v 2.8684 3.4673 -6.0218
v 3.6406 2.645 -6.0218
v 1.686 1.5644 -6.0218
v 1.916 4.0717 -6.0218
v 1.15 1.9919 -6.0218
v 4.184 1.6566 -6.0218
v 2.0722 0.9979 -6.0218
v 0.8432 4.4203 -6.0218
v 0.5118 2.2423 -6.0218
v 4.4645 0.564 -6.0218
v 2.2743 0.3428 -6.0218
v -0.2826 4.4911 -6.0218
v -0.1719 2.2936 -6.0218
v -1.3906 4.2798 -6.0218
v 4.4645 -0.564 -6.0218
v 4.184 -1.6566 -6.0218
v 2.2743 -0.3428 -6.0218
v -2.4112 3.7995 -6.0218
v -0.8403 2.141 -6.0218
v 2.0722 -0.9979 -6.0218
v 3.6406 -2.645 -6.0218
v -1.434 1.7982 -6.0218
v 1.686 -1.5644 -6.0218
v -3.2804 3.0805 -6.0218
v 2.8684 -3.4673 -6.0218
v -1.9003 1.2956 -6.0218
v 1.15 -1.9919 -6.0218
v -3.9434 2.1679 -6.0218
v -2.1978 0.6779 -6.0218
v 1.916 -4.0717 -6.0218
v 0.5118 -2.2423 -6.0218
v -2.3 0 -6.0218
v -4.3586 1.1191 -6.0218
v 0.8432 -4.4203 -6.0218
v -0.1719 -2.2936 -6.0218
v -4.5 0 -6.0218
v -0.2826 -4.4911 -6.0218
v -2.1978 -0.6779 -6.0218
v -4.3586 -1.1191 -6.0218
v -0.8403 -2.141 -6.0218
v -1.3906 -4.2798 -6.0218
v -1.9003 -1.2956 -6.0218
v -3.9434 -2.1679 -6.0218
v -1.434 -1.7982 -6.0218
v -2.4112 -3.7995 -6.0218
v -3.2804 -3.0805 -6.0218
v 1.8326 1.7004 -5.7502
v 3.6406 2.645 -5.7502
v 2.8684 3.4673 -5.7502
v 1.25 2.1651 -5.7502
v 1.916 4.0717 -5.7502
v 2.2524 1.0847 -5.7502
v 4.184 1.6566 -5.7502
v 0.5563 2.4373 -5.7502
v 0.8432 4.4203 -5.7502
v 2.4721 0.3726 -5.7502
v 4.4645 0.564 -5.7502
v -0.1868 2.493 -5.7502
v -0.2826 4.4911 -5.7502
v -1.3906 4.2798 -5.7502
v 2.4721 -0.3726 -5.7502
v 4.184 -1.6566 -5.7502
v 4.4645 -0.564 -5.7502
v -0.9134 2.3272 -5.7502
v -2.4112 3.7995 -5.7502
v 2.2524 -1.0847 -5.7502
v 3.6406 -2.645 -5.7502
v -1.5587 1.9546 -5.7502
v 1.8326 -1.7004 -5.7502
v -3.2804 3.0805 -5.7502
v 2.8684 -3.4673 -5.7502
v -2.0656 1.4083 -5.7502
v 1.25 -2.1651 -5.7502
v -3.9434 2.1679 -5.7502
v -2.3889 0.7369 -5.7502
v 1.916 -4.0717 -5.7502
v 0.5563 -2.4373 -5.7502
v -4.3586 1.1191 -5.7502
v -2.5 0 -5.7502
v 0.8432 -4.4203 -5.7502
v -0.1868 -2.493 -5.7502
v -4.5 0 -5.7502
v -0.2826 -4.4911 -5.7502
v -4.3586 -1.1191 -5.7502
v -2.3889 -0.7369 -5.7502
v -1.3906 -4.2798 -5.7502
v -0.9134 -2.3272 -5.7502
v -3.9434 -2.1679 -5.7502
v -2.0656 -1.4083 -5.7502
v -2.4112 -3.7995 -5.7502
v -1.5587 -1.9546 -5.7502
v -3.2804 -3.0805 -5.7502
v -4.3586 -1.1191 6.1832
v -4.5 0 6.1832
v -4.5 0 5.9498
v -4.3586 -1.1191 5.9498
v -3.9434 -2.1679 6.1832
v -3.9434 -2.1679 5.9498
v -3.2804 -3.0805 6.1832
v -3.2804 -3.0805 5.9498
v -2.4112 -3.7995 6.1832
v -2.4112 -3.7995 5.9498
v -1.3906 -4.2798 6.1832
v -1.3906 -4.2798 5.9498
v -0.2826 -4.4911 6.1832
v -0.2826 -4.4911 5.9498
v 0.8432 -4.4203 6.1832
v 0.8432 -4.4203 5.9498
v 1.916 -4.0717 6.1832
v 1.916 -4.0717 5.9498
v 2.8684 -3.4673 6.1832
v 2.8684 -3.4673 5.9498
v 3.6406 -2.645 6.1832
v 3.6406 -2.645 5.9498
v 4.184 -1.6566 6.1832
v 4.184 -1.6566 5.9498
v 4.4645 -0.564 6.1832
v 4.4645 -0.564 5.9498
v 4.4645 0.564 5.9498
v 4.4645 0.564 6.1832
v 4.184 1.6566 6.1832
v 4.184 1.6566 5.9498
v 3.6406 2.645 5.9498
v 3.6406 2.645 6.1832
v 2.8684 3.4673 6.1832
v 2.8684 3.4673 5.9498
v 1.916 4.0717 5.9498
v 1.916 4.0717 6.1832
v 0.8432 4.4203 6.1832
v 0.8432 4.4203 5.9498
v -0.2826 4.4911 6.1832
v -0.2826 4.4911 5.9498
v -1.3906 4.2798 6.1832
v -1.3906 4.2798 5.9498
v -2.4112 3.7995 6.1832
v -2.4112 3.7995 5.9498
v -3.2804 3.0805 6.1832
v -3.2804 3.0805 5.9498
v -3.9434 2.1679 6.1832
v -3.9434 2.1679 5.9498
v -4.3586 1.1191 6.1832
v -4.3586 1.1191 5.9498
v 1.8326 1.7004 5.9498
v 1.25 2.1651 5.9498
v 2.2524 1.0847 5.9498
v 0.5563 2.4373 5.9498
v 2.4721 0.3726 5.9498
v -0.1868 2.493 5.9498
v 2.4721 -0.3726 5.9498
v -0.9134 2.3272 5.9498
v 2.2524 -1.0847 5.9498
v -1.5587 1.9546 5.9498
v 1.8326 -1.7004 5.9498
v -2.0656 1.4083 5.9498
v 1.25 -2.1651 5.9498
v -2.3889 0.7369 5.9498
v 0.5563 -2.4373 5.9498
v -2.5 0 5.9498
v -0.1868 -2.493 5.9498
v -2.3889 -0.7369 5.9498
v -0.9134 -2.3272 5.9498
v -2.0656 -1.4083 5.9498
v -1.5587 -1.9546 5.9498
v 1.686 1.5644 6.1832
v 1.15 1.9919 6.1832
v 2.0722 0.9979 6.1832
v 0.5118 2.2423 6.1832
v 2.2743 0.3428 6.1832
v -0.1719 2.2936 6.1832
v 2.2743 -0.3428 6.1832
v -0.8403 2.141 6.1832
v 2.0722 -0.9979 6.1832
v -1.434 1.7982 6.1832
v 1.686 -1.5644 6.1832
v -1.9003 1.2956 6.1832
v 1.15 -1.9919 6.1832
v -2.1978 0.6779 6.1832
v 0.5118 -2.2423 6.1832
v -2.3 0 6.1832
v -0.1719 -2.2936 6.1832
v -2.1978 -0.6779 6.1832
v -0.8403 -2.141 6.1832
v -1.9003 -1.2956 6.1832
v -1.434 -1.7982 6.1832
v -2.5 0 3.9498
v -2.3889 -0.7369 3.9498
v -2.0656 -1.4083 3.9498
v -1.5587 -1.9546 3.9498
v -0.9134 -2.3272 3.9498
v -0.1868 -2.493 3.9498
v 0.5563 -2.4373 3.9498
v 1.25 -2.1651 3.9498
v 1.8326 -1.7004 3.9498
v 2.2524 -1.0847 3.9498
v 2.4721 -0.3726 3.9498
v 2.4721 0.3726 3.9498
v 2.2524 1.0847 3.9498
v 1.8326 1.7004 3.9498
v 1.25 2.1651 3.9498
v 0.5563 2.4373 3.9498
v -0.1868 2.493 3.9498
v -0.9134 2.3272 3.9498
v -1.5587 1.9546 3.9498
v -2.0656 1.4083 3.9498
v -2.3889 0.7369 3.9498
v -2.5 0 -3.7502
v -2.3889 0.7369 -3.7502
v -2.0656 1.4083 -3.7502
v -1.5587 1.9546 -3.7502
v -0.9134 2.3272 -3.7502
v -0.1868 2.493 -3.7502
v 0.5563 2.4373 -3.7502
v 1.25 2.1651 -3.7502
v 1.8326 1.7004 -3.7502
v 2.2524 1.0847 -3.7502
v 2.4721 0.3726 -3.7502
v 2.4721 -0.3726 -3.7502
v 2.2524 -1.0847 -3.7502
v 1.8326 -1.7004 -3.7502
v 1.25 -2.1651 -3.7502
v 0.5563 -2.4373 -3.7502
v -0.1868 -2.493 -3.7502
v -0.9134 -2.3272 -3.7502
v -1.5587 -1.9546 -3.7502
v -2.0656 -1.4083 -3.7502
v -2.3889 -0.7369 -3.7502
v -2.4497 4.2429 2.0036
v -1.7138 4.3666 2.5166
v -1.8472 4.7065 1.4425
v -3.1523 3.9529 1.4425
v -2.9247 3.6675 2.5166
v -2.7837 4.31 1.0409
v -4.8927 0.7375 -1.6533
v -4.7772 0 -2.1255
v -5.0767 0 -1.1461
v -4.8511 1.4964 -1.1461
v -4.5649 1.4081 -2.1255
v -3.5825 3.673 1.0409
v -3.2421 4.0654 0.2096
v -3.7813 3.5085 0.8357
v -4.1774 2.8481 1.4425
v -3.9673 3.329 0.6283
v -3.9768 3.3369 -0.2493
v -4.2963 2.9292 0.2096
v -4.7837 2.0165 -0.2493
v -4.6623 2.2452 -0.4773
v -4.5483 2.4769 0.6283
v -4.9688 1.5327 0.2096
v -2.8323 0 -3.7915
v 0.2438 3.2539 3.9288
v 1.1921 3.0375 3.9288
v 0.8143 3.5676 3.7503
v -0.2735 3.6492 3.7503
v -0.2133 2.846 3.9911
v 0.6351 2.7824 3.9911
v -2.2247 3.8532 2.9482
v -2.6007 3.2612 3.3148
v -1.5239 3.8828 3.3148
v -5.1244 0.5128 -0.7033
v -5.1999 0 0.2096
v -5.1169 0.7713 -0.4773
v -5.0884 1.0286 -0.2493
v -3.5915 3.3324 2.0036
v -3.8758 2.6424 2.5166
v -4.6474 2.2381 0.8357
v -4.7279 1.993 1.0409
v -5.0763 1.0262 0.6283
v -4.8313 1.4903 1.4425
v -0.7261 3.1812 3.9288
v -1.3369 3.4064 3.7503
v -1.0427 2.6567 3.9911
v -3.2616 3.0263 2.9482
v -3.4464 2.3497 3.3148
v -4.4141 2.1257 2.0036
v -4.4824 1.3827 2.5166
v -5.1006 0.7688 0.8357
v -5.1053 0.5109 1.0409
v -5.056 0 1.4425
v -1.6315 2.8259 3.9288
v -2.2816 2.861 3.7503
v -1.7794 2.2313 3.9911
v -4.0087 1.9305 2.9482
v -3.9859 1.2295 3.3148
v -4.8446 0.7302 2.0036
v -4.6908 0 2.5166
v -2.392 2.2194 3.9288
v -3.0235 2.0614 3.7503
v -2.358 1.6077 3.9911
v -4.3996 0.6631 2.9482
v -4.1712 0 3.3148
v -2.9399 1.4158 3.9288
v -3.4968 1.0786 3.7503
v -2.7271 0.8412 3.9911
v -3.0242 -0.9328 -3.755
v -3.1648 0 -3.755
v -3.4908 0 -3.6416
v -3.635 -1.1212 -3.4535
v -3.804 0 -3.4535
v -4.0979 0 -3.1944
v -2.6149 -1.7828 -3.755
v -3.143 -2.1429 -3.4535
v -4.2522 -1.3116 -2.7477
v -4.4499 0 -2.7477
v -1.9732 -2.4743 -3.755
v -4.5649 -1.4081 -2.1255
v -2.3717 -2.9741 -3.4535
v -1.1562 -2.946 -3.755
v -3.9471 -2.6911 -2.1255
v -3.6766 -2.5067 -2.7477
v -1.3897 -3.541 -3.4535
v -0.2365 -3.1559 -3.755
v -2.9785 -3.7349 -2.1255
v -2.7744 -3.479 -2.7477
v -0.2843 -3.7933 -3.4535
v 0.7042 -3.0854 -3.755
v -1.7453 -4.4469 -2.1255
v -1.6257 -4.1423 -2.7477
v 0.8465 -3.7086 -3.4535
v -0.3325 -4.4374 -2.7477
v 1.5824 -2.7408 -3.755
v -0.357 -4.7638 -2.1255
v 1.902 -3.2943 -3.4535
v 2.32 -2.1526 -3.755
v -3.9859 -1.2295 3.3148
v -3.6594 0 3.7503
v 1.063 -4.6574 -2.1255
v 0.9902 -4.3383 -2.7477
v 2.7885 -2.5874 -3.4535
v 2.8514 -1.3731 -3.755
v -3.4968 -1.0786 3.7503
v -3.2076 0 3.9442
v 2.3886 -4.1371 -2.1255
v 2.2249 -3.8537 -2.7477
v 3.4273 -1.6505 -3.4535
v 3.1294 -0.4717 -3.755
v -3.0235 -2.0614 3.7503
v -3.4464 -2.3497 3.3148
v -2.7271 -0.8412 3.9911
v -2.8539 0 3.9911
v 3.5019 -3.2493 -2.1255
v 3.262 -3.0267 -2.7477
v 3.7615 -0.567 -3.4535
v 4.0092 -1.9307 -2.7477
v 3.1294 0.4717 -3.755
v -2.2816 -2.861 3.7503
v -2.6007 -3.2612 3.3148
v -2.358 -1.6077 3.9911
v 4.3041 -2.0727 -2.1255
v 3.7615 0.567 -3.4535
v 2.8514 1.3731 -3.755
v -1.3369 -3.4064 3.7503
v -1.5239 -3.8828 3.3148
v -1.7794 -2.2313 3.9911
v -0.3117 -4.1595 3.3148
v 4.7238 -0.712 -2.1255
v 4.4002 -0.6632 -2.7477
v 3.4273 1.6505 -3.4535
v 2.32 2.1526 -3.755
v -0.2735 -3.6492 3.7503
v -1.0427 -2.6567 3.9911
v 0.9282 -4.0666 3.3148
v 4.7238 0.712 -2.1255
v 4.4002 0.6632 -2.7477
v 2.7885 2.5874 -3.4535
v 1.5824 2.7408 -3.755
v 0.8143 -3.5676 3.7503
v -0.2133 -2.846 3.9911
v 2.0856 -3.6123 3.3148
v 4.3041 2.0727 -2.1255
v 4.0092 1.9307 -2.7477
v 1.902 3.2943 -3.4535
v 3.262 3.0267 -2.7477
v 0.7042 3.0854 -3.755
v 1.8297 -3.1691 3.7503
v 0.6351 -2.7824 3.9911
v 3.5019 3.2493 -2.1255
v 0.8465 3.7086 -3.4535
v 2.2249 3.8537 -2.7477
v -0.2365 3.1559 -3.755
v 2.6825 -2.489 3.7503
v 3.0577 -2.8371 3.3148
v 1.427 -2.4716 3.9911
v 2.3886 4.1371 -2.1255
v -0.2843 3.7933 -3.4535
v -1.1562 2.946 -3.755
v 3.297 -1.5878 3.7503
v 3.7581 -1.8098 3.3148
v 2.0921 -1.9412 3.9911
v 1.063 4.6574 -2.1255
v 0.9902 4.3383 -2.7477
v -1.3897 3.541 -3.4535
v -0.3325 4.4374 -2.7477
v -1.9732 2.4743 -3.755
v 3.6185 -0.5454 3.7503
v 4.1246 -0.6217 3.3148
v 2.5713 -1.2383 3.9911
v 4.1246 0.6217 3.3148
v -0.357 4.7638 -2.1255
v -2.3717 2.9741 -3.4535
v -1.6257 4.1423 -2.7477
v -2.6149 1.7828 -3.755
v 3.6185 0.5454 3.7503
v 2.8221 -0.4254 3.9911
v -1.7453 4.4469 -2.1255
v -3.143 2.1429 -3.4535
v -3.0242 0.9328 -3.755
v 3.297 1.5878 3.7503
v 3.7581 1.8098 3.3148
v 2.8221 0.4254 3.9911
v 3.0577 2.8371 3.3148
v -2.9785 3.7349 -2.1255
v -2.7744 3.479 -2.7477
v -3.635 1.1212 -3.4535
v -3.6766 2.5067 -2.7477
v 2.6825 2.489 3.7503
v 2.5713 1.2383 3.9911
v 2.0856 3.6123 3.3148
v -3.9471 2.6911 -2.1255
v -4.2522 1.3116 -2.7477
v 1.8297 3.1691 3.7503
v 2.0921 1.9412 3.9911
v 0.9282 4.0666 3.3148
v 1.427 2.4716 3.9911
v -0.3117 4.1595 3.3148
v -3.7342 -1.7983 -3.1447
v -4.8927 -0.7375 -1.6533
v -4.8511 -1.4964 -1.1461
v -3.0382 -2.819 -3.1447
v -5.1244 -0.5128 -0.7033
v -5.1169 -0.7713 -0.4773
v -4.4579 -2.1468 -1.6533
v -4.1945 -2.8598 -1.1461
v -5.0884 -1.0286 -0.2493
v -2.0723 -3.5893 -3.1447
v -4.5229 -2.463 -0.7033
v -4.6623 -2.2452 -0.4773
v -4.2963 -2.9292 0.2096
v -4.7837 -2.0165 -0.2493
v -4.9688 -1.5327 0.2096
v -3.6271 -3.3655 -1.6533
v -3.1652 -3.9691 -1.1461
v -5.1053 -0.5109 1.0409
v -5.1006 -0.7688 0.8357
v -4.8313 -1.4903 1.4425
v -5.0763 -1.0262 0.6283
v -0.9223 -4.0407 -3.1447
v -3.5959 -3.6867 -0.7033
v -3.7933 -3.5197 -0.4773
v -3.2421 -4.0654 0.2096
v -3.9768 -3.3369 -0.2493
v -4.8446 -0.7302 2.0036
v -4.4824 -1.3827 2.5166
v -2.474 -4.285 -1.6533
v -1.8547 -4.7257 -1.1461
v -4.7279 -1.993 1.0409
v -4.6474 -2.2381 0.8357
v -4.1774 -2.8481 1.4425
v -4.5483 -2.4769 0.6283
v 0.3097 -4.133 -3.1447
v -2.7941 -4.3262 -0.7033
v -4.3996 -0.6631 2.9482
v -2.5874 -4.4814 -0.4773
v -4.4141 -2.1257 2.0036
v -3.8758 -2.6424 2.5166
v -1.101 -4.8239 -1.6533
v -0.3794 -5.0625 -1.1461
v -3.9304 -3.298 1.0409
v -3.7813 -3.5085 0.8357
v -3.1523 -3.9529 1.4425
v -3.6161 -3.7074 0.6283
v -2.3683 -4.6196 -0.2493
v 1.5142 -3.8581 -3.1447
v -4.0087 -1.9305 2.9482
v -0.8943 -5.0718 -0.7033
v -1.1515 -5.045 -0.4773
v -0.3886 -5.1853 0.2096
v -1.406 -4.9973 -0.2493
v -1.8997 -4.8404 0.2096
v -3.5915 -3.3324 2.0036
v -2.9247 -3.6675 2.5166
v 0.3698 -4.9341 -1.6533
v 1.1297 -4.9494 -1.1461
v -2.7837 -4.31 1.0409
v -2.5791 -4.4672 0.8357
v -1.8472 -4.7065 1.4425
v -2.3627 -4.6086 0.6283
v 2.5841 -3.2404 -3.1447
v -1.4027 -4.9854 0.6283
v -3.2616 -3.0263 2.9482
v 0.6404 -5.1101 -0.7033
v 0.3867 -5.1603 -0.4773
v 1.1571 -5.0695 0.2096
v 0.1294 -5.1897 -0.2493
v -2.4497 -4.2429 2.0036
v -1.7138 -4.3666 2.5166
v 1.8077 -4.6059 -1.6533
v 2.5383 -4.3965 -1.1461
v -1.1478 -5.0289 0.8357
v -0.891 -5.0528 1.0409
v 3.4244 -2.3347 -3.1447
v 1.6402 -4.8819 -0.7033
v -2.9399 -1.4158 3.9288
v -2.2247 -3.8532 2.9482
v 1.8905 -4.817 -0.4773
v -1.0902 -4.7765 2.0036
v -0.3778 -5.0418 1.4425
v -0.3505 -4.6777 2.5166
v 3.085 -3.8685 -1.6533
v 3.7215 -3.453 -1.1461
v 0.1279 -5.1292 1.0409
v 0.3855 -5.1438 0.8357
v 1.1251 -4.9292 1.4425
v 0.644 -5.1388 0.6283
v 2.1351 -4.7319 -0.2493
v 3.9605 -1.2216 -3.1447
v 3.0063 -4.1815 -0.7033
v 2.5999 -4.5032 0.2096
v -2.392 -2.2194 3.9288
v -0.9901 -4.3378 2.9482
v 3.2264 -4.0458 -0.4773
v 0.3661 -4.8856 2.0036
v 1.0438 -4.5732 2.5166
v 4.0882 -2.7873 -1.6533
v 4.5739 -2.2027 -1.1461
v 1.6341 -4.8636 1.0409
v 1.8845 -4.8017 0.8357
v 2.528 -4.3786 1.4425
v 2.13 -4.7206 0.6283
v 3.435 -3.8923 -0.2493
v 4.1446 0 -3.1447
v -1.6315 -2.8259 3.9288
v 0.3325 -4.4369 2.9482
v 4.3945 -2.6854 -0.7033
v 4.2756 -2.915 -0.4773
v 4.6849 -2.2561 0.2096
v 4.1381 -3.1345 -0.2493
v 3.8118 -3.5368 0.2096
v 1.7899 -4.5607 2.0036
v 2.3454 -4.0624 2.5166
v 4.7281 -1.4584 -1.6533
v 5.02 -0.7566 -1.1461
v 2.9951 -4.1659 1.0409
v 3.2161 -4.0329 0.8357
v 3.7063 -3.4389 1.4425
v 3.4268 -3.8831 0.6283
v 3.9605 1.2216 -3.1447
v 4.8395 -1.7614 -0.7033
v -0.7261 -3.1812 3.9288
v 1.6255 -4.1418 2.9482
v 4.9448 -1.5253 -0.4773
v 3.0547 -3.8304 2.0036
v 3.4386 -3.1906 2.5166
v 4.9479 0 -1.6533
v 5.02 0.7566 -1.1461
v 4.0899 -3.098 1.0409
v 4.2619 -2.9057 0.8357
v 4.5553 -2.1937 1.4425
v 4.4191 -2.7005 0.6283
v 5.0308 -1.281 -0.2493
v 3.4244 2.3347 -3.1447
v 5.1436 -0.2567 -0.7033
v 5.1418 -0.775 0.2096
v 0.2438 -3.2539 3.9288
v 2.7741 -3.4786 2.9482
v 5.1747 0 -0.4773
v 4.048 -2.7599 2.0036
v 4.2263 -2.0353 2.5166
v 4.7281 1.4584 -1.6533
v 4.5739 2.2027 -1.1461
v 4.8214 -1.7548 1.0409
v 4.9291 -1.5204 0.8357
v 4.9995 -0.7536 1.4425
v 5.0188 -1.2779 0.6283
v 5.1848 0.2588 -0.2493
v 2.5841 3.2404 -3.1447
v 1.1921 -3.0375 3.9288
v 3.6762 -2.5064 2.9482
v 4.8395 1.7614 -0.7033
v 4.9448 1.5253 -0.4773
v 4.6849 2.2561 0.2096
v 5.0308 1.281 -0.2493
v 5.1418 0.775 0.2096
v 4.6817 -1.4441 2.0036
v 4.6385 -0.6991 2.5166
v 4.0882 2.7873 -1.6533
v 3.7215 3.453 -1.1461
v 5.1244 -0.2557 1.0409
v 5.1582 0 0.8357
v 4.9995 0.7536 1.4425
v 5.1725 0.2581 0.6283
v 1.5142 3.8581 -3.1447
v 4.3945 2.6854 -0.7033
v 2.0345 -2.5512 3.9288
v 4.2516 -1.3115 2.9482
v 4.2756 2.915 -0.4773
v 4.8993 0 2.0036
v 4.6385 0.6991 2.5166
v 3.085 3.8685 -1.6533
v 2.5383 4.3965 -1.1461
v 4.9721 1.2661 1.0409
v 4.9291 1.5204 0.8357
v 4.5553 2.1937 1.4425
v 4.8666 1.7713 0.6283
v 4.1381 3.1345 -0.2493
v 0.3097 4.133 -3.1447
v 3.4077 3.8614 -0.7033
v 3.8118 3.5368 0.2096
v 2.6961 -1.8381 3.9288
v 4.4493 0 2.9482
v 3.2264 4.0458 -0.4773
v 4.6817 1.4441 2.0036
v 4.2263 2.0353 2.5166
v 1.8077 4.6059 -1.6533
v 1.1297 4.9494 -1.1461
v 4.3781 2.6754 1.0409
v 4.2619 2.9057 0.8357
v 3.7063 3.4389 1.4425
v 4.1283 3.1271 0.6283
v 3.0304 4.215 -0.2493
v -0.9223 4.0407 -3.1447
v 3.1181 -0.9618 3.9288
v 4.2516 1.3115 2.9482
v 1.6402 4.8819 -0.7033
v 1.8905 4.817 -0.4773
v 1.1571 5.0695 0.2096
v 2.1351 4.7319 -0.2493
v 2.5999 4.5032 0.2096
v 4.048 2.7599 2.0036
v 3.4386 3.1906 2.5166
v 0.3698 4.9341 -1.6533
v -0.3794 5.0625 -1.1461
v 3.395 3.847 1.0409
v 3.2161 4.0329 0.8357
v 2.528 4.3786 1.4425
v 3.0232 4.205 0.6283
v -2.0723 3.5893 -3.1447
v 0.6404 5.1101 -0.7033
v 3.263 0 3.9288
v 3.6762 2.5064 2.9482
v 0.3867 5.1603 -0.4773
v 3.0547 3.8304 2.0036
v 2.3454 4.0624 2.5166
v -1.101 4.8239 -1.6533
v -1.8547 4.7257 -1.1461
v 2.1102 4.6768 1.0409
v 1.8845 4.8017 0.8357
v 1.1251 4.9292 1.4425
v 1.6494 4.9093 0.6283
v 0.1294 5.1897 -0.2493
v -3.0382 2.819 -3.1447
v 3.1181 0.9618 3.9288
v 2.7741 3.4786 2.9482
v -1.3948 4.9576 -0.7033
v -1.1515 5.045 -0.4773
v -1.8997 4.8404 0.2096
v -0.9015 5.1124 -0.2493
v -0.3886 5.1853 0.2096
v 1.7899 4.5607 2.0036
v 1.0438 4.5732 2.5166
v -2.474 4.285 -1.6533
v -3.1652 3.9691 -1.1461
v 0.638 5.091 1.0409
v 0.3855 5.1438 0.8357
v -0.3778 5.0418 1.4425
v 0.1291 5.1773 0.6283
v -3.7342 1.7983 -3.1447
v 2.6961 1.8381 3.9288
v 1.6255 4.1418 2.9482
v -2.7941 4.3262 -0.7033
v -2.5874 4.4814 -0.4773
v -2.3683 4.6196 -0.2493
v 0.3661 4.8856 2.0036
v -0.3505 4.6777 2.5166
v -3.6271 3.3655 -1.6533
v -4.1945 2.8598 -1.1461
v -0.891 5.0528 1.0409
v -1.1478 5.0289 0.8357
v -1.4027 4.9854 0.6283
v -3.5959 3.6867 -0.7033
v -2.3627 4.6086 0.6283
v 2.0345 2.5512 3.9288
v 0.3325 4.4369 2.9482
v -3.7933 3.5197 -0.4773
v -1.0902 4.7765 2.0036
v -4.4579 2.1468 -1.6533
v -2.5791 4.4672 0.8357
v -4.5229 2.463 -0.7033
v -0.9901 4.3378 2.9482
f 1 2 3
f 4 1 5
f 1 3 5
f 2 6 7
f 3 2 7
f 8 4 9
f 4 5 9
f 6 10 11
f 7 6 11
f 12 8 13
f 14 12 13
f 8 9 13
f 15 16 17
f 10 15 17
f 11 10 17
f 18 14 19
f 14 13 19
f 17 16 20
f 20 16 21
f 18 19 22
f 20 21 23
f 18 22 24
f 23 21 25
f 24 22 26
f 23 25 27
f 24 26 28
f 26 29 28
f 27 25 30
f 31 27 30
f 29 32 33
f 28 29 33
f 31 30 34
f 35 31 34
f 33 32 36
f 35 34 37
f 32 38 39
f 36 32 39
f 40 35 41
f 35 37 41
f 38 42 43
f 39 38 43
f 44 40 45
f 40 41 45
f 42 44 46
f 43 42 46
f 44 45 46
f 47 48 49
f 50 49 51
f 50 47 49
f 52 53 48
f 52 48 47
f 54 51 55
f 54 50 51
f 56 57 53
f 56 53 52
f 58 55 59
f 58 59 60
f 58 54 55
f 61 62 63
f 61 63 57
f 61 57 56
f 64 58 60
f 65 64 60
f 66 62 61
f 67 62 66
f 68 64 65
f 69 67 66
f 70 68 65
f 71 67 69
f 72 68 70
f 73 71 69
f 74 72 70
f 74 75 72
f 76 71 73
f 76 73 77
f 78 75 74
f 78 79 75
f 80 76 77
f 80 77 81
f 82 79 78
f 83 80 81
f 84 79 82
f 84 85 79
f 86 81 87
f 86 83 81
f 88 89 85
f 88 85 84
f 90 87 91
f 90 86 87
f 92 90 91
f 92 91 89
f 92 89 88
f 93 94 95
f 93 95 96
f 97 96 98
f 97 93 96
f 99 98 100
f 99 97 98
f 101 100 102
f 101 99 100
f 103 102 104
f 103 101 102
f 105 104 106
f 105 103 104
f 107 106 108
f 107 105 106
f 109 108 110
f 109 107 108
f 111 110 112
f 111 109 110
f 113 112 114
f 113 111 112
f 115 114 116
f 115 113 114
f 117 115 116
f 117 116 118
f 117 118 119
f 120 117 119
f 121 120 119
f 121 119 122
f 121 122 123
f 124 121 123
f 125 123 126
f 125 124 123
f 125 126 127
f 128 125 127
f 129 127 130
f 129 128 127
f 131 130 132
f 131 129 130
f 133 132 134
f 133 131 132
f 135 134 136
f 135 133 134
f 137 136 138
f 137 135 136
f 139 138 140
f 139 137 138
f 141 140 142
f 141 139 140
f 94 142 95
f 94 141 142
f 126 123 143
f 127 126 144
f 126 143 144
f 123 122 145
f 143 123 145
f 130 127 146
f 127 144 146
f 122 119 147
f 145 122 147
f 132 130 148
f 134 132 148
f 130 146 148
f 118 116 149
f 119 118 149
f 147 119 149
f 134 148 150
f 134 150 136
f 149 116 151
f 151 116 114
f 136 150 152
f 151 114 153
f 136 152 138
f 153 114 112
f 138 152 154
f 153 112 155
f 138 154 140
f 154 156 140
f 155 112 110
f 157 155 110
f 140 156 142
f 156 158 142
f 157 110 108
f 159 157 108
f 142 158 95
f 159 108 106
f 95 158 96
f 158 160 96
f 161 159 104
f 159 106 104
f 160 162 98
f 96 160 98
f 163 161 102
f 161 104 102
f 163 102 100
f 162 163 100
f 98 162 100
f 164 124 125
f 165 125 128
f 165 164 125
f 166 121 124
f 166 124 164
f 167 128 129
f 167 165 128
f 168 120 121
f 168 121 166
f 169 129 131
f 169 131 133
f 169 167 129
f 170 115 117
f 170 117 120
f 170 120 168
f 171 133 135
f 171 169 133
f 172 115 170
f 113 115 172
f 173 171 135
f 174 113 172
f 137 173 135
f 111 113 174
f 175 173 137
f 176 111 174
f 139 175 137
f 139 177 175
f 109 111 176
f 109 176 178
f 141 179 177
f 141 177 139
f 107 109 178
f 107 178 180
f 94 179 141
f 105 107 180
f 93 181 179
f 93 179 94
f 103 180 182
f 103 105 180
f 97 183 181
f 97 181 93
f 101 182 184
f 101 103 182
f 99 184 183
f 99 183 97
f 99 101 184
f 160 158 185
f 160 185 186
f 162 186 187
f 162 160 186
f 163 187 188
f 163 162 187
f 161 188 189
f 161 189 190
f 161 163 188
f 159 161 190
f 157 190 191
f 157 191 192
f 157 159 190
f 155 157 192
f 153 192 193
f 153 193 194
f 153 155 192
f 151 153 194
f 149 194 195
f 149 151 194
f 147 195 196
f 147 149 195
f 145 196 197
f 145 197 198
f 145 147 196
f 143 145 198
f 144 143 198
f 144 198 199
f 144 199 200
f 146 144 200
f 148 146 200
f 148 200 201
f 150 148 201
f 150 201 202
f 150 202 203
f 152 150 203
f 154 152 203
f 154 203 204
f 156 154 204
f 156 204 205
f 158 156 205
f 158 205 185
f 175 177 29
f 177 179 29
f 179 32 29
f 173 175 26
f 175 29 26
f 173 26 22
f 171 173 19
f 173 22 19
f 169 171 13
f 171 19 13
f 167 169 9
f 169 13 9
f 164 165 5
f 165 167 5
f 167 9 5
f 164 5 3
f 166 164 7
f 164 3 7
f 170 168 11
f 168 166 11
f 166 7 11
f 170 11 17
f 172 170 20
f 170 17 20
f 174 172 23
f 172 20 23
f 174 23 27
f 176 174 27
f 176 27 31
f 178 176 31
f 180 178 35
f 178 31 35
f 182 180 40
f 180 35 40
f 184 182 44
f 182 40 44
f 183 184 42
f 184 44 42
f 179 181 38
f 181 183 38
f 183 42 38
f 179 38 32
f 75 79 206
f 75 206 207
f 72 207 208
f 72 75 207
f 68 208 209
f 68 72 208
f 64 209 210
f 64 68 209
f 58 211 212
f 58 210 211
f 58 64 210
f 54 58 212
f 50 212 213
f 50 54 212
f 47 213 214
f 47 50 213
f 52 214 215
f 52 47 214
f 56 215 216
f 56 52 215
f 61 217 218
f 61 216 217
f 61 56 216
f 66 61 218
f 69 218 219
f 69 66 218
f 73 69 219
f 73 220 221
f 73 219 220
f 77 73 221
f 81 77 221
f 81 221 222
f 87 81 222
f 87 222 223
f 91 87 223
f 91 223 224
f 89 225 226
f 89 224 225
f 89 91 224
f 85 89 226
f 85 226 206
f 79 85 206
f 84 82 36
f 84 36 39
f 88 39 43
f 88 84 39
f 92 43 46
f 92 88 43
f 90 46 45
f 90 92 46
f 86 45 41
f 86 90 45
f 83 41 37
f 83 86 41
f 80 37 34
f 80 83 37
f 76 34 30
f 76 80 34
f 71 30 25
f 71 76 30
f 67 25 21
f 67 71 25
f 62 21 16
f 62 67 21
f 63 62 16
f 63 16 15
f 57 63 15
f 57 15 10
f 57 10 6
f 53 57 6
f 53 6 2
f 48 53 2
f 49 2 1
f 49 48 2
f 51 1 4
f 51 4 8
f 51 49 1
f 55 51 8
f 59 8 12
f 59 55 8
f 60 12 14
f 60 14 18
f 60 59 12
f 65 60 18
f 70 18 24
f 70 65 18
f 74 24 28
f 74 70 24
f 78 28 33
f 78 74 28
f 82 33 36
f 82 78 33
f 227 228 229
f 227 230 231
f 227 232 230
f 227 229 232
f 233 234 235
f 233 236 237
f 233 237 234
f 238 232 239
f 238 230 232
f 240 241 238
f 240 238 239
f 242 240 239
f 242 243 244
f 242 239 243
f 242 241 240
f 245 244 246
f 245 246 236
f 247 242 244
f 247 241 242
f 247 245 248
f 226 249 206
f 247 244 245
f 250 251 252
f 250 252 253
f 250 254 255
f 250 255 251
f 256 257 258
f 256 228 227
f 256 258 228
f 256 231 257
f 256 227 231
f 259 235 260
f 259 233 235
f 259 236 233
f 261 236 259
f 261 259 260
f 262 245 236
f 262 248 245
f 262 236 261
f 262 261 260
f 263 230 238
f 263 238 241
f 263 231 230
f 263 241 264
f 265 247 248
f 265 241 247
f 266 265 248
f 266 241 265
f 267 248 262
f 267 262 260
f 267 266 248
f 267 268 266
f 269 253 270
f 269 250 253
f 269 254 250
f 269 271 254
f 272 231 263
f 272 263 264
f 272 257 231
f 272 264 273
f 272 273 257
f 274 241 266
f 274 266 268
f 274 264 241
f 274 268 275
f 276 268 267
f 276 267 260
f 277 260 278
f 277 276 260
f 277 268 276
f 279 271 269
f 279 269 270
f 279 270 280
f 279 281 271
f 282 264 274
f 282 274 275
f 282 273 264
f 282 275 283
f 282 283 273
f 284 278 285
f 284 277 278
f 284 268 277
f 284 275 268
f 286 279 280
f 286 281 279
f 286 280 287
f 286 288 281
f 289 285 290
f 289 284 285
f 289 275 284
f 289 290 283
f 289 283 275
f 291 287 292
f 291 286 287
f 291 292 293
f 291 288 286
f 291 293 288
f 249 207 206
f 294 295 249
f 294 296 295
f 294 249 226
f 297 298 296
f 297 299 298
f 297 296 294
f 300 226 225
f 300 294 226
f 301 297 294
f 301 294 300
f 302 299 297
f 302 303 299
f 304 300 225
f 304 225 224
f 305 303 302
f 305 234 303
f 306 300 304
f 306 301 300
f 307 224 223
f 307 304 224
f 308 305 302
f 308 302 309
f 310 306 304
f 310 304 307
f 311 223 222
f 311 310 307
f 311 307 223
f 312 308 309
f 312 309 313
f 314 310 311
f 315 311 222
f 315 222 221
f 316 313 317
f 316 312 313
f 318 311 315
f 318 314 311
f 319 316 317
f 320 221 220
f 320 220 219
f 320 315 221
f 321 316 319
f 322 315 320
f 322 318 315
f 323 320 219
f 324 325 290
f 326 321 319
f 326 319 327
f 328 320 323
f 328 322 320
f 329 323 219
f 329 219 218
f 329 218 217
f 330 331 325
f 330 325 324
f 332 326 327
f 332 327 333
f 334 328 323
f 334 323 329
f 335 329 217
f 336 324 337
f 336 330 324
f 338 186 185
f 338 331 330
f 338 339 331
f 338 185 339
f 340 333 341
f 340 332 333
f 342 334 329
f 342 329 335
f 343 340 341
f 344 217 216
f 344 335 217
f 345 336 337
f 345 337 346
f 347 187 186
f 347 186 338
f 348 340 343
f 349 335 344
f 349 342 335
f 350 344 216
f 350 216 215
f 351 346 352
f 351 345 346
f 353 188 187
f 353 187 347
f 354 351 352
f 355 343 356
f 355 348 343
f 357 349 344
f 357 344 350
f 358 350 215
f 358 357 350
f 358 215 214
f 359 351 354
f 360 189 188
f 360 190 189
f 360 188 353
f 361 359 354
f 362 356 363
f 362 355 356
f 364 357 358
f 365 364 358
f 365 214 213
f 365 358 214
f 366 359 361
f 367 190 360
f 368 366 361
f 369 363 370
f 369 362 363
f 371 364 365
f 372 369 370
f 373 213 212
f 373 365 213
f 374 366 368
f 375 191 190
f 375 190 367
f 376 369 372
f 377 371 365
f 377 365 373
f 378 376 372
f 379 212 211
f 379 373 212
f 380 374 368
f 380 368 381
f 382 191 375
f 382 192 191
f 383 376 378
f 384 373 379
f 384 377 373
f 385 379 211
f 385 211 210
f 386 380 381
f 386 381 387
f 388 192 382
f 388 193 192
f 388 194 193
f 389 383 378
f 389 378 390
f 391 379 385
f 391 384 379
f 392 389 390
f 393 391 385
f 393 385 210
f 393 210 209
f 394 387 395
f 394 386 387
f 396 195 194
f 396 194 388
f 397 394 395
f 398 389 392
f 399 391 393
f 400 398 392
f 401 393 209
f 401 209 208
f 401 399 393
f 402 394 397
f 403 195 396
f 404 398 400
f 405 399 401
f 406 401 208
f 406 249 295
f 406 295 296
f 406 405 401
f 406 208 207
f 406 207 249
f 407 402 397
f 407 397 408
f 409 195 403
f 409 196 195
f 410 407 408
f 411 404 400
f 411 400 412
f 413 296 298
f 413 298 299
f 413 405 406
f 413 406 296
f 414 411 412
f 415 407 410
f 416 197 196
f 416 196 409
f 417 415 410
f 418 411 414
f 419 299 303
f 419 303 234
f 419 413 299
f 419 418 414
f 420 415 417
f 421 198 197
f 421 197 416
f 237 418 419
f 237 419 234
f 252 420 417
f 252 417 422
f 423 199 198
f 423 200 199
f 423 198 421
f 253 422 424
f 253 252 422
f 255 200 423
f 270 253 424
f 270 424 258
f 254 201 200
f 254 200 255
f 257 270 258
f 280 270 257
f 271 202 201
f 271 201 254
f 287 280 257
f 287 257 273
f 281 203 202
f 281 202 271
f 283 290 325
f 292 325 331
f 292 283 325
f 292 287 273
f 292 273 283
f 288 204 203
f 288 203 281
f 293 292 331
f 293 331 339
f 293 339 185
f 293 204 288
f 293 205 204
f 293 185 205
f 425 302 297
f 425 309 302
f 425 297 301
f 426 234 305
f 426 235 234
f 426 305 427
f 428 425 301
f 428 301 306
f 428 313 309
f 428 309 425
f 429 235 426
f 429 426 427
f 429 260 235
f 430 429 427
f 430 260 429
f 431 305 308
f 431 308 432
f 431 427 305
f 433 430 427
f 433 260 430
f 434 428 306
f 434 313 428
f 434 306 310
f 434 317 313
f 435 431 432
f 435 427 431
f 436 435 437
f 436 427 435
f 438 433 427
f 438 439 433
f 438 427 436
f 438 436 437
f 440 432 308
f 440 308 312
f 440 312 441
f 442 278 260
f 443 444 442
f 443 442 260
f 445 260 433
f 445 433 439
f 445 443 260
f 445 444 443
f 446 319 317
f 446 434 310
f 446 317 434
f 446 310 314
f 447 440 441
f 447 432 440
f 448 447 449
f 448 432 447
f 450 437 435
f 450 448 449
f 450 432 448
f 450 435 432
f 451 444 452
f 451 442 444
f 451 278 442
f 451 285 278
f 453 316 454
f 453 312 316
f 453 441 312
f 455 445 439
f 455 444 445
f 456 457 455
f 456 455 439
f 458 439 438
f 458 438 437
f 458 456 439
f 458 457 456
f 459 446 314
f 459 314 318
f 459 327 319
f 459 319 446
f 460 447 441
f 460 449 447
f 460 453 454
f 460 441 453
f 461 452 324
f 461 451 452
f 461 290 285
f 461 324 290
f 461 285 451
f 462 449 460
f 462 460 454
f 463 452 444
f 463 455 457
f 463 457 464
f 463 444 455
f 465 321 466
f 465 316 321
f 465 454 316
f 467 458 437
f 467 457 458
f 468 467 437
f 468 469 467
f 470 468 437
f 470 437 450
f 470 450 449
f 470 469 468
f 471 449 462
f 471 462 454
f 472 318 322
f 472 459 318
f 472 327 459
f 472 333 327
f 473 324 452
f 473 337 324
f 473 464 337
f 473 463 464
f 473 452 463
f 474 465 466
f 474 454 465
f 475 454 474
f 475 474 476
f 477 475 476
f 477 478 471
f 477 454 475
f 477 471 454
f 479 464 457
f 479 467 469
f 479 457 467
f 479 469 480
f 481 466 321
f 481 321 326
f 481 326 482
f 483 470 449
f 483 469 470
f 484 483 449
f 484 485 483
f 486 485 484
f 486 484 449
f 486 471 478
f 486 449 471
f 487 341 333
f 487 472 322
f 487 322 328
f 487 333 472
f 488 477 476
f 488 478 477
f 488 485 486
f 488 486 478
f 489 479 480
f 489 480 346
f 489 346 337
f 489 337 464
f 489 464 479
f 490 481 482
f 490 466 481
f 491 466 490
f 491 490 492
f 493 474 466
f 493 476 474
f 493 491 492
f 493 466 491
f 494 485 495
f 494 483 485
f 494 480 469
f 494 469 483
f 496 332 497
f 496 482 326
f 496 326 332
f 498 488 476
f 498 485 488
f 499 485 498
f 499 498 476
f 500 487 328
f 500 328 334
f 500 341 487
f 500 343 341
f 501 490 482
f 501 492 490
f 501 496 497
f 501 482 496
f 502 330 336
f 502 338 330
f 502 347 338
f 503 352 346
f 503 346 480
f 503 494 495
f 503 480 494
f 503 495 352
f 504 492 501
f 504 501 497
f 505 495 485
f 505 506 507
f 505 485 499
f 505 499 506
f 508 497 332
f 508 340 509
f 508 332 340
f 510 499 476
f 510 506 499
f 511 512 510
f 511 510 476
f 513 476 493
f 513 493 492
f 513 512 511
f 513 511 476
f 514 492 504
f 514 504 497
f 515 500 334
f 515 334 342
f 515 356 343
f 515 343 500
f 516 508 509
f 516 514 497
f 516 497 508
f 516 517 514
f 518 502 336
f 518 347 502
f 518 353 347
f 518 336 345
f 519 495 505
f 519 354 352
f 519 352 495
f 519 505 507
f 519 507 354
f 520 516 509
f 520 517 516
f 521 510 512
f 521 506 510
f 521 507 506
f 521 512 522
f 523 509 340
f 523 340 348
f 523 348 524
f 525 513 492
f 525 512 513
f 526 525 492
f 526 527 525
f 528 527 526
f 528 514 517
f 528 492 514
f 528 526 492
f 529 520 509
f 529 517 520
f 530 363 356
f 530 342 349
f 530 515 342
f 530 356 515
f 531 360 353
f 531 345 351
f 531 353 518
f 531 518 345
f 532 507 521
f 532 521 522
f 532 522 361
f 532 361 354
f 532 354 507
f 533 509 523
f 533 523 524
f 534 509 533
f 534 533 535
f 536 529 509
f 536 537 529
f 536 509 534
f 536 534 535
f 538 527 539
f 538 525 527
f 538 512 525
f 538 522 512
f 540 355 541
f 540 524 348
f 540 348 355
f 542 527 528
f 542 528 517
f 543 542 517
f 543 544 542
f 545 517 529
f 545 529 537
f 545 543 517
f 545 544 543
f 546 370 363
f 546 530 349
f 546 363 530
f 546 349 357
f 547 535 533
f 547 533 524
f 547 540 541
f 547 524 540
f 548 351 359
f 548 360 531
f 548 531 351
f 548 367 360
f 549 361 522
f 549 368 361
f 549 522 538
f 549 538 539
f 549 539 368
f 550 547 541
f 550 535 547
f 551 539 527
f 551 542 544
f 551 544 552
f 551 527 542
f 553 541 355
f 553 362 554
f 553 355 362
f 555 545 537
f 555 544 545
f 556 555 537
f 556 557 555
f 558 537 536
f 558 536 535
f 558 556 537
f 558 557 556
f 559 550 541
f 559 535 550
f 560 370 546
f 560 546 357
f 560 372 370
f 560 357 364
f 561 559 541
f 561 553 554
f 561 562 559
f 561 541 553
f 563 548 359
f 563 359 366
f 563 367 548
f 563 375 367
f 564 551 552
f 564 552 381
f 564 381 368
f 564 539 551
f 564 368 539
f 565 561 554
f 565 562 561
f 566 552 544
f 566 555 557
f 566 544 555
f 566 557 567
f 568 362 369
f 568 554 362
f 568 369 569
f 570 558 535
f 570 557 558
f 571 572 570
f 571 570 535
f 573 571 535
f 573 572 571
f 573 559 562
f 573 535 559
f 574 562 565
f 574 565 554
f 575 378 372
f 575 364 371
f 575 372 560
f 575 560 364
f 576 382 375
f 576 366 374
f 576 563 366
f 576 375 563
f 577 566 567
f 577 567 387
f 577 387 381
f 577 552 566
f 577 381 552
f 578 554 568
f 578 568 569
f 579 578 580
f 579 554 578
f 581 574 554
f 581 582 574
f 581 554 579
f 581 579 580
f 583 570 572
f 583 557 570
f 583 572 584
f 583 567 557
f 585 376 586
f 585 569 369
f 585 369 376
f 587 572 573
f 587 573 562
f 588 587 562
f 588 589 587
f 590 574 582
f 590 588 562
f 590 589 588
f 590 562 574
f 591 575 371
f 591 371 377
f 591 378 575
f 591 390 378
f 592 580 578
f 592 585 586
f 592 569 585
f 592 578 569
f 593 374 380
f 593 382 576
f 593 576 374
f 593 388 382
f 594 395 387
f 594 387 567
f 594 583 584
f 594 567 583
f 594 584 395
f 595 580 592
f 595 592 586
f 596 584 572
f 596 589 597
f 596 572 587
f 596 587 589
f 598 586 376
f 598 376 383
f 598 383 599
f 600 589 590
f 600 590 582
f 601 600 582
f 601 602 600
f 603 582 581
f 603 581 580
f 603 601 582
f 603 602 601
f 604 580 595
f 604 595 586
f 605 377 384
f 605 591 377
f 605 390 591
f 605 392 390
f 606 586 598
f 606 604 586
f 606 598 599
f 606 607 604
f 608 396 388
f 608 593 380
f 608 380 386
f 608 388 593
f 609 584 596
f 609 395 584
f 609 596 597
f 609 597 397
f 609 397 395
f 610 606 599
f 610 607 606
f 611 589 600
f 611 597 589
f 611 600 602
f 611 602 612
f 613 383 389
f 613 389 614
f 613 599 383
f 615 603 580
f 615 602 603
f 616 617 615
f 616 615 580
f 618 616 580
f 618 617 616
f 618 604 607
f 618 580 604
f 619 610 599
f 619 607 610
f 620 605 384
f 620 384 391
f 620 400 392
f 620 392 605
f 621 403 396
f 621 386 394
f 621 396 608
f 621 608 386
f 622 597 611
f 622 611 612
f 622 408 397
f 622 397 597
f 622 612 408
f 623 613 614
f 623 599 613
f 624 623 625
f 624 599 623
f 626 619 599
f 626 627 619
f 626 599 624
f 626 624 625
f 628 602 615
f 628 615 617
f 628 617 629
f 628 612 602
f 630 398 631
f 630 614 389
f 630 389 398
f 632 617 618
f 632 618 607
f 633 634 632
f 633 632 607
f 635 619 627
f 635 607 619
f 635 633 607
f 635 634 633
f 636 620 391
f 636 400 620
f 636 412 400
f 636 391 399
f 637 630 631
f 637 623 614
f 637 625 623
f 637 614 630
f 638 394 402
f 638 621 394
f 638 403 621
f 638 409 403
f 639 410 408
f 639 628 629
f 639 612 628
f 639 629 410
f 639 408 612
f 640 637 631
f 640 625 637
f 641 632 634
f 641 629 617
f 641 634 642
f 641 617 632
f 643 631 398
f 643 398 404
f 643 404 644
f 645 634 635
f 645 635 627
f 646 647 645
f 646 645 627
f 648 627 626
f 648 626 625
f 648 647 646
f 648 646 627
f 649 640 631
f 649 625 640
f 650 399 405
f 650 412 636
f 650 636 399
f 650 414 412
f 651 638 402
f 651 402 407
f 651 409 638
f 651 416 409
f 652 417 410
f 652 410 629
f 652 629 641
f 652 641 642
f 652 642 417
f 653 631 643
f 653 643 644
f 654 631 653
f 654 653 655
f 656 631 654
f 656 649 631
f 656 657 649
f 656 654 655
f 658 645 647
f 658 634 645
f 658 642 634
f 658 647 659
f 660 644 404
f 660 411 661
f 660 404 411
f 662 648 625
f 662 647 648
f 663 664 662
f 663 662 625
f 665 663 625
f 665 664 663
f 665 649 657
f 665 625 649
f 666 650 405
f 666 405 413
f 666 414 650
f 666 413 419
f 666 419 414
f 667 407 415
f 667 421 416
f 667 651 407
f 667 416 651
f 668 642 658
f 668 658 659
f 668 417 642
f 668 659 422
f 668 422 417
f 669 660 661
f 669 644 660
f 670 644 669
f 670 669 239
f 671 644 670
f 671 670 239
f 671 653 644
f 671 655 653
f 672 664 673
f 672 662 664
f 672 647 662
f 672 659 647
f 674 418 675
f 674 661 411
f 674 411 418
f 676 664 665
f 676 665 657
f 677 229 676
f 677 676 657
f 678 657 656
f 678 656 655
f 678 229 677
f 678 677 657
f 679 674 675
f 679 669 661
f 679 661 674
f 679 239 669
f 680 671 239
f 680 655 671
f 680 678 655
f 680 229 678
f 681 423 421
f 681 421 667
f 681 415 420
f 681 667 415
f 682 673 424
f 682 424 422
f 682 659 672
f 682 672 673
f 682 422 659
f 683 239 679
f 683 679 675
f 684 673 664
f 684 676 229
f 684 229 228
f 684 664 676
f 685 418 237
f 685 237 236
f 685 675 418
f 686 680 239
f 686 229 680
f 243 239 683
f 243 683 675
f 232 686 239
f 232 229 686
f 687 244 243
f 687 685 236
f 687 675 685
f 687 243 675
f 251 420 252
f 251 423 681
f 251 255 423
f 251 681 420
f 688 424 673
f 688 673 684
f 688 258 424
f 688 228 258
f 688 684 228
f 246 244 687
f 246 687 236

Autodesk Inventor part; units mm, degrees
sketch "Sketch5" plane through (0, 0, 0) normal (0, 1, 0) x (-1, 0, 0)
  line L0 (0, -8.4628) -> (0, 8.6242) projected
  ellipse E0 centre (2.8427, 0.0998) end of major axis (0.4846, 0.0998) minor radius 3.8913 (2.5, -3.7502) -> (2.5, 3.9498) ccw
  line L1 (2.5, -3.7502) -> (2.5, -5.7502)
  line L2 (2.5, -5.7502) -> (4.5, -5.7502)
  line L3 (2.5, 3.9498) -> (2.5, 5.9498)
  line L4 (2.5, 5.9498) -> (4.5, 5.9498)
  line L5 (4.5, 5.9498) -> (4.5, 6.1832)
  line L6 (4.5, 6.1832) -> (2.3, 6.1832)
  line L7 (2.3, 6.1832) -> (2.3, -6.0218)
  line L8 (2.3, -6.0218) -> (4.5, -6.0218)
  line L9 (4.5, -6.0218) -> (4.5, -5.7502)
  point P0 (0, 0)
  point P1 (5.2, -0.0087)
  dimension "d8" = 2
  dimension "d9" = 2
  dimension "d10" = 7.7
  dimension "d11" = 2.7
  dimension "d12" = 0.2
  dimension "d15" = 2.5
revolve "Revolution1" add sketch "Sketch5" angle 360 about axis through (0, 0, -10) along (0, 0, 1)
properties part number "bump_black_small" material "Rubber"
